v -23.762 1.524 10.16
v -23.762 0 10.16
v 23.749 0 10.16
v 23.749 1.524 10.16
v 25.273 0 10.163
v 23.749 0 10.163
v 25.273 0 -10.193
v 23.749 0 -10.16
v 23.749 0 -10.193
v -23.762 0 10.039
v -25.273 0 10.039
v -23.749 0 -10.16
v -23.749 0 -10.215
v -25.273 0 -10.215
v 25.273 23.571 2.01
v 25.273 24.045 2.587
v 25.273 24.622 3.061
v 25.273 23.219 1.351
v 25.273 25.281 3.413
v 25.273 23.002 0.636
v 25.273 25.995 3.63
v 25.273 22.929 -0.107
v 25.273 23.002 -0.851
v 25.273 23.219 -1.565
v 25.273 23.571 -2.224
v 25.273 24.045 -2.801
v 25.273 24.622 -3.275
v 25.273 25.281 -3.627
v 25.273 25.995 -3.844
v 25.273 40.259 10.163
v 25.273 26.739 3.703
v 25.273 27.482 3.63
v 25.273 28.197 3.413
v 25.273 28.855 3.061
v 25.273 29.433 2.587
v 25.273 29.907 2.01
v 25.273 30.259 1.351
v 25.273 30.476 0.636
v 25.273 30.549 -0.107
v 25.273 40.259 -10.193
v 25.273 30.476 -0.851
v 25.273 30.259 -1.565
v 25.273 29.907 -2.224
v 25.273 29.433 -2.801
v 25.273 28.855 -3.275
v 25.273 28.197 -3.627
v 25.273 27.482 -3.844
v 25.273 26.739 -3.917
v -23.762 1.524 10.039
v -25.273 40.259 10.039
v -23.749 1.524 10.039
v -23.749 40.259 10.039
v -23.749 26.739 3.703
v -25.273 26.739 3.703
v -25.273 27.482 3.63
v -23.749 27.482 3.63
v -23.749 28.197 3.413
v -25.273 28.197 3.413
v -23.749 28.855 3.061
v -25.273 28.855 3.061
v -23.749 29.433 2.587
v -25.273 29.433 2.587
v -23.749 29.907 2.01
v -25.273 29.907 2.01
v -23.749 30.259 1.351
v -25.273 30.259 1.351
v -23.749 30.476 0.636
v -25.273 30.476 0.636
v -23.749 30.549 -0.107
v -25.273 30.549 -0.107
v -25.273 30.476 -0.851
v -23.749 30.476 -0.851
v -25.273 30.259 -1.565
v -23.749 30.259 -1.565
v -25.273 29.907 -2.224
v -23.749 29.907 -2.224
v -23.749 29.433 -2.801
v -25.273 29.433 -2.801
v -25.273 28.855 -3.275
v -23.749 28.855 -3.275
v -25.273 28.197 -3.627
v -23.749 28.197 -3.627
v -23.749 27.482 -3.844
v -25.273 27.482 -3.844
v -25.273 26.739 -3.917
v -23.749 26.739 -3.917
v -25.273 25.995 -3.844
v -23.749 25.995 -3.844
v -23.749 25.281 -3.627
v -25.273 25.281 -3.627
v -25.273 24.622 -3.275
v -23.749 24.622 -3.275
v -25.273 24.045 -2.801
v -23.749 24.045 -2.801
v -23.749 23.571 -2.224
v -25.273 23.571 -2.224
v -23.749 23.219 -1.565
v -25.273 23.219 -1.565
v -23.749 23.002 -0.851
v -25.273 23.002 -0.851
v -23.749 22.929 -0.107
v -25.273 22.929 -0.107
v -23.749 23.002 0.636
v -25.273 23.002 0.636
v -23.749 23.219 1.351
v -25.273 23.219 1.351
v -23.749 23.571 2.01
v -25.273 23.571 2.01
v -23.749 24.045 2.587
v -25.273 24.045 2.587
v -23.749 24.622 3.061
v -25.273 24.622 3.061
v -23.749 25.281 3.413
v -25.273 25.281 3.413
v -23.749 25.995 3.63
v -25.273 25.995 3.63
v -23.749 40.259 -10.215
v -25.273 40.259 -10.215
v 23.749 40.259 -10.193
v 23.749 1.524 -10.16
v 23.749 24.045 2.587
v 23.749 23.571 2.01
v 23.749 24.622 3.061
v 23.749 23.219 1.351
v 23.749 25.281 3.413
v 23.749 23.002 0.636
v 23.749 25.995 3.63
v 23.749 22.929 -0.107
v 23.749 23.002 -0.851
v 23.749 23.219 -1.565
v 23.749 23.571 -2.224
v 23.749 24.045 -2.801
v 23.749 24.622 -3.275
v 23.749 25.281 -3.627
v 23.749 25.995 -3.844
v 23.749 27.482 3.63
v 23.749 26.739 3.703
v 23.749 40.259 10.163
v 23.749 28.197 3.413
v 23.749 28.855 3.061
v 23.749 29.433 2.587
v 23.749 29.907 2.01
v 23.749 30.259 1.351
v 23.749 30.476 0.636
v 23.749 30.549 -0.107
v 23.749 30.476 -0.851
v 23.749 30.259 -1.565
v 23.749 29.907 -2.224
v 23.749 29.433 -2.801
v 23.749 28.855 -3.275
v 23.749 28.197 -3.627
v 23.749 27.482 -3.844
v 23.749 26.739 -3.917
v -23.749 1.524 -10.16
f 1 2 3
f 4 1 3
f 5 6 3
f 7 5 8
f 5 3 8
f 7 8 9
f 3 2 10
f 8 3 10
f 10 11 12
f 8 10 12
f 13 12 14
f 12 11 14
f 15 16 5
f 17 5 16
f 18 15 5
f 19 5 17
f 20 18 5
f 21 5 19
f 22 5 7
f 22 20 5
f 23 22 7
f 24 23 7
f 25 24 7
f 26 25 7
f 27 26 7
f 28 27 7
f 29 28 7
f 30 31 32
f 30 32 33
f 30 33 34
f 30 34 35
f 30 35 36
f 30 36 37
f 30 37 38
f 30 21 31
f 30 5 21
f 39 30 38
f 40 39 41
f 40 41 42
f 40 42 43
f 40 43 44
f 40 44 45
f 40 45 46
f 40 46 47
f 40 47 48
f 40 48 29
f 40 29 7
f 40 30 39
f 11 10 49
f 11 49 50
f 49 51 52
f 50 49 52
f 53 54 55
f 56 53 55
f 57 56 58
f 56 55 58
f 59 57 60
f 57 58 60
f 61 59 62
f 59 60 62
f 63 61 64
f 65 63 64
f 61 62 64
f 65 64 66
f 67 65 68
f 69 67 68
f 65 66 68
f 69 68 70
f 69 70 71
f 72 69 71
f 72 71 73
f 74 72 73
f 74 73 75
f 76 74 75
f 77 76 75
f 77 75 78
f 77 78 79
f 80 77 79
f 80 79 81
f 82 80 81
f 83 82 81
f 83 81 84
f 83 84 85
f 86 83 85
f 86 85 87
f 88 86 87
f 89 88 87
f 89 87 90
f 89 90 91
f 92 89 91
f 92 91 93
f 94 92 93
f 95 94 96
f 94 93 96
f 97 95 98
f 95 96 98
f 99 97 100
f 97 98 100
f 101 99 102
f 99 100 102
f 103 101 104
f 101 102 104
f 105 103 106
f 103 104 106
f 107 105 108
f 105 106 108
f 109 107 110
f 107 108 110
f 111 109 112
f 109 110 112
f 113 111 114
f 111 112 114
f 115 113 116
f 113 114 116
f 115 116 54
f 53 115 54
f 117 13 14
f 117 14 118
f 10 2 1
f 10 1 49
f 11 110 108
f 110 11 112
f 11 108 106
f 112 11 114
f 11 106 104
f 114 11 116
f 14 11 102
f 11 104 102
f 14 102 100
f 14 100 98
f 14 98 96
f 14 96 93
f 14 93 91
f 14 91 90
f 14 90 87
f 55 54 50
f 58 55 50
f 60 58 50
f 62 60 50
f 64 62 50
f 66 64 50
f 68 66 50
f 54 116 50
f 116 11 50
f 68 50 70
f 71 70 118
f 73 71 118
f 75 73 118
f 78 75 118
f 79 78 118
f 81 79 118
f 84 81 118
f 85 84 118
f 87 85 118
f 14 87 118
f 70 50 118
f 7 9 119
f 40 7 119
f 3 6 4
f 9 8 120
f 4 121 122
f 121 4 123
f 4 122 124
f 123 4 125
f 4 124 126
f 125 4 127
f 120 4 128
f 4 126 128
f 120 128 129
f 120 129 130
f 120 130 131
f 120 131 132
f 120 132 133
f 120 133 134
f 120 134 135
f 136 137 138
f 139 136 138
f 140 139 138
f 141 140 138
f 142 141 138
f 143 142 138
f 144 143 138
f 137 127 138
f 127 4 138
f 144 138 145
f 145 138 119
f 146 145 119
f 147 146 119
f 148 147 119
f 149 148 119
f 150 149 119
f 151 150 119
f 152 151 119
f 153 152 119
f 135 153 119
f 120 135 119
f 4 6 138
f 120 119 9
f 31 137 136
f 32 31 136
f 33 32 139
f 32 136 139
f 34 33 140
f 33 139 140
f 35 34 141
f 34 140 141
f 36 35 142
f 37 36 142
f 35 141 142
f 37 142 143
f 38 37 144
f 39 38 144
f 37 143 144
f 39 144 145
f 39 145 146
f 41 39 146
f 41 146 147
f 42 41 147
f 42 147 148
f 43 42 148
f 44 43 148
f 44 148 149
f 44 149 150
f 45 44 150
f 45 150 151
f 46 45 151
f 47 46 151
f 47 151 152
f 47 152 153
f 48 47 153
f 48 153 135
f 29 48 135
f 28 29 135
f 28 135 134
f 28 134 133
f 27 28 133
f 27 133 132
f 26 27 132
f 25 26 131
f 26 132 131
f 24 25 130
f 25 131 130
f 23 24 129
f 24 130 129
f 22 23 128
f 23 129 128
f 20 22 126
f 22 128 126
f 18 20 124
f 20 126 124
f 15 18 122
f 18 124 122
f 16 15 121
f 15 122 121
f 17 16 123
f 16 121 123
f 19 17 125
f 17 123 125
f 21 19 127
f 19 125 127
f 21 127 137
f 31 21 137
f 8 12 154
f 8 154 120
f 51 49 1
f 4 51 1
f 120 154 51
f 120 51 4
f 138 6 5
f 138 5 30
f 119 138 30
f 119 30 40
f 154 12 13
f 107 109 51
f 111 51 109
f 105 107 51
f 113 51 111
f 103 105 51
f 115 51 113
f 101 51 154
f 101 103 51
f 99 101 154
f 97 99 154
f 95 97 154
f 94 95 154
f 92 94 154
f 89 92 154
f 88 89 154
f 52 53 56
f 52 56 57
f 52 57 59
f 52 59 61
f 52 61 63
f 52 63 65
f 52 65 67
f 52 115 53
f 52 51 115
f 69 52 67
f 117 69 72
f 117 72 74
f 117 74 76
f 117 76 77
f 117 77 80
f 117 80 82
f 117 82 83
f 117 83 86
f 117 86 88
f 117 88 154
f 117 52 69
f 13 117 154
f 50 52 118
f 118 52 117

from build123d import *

# Parameters (mm, degrees)
SKETCH1_W           = 47.5234
SKETCH1_H           = 20.32
BOSS_EXTRUDE1_DEPTH = 1.524
SKETCH2_W           = 20.254011441
SKETCH2_H           = 40.259
BOSS_EXTRUDE2_DEPTH = 1.524
SKETCH3_W           = 20.355556003
SKETCH3_H           = 40.259
BOSS_EXTRUDE3_DEPTH = 1.524
SKETCH5_R           = 3.81
CUT_EXTRUDE1_DEPTH  = 66.421937049


with BuildPart() as part:
    # Sketch1 → Boss-Extrude1 (new body)
    with BuildSketch(Plane(origin=(0, 0, 0), x_dir=(1, 0, 0), z_dir=(0, 1, 0))):
        Rectangle(SKETCH1_W, SKETCH1_H)
    extrude(amount=BOSS_EXTRUDE1_DEPTH)

    # Sketch2 → Boss-Extrude2 (add)
    with BuildSketch(Plane(origin=(-23.749, 0, 0), x_dir=(0, 0, -1), z_dir=(1, 0, 0))):
        with Locations((0.087917198, 20.1295)):
            Rectangle(SKETCH2_W, SKETCH2_H)
    extrude(amount=-BOSS_EXTRUDE2_DEPTH)

    # Sketch3 → Boss-Extrude3 (add)
    with BuildSketch(Plane(origin=(23.749, 0, 0), x_dir=(0, 0, -1), z_dir=(1, 0, 0))):
        with Locations((0.014847815, 20.1295)):
            Rectangle(SKETCH3_W, SKETCH3_H)
    extrude(amount=BOSS_EXTRUDE3_DEPTH)

    # Sketch5 → Cut-Extrude1 (cut, through all)
    with BuildSketch(Plane.ZY.offset(25.273)):
        with Locations((-0.107211081, 26.738775407)):
            Circle(SKETCH5_R)
    extrude(amount=-CUT_EXTRUDE1_DEPTH, mode=Mode.SUBTRACT)


solid = part.part
